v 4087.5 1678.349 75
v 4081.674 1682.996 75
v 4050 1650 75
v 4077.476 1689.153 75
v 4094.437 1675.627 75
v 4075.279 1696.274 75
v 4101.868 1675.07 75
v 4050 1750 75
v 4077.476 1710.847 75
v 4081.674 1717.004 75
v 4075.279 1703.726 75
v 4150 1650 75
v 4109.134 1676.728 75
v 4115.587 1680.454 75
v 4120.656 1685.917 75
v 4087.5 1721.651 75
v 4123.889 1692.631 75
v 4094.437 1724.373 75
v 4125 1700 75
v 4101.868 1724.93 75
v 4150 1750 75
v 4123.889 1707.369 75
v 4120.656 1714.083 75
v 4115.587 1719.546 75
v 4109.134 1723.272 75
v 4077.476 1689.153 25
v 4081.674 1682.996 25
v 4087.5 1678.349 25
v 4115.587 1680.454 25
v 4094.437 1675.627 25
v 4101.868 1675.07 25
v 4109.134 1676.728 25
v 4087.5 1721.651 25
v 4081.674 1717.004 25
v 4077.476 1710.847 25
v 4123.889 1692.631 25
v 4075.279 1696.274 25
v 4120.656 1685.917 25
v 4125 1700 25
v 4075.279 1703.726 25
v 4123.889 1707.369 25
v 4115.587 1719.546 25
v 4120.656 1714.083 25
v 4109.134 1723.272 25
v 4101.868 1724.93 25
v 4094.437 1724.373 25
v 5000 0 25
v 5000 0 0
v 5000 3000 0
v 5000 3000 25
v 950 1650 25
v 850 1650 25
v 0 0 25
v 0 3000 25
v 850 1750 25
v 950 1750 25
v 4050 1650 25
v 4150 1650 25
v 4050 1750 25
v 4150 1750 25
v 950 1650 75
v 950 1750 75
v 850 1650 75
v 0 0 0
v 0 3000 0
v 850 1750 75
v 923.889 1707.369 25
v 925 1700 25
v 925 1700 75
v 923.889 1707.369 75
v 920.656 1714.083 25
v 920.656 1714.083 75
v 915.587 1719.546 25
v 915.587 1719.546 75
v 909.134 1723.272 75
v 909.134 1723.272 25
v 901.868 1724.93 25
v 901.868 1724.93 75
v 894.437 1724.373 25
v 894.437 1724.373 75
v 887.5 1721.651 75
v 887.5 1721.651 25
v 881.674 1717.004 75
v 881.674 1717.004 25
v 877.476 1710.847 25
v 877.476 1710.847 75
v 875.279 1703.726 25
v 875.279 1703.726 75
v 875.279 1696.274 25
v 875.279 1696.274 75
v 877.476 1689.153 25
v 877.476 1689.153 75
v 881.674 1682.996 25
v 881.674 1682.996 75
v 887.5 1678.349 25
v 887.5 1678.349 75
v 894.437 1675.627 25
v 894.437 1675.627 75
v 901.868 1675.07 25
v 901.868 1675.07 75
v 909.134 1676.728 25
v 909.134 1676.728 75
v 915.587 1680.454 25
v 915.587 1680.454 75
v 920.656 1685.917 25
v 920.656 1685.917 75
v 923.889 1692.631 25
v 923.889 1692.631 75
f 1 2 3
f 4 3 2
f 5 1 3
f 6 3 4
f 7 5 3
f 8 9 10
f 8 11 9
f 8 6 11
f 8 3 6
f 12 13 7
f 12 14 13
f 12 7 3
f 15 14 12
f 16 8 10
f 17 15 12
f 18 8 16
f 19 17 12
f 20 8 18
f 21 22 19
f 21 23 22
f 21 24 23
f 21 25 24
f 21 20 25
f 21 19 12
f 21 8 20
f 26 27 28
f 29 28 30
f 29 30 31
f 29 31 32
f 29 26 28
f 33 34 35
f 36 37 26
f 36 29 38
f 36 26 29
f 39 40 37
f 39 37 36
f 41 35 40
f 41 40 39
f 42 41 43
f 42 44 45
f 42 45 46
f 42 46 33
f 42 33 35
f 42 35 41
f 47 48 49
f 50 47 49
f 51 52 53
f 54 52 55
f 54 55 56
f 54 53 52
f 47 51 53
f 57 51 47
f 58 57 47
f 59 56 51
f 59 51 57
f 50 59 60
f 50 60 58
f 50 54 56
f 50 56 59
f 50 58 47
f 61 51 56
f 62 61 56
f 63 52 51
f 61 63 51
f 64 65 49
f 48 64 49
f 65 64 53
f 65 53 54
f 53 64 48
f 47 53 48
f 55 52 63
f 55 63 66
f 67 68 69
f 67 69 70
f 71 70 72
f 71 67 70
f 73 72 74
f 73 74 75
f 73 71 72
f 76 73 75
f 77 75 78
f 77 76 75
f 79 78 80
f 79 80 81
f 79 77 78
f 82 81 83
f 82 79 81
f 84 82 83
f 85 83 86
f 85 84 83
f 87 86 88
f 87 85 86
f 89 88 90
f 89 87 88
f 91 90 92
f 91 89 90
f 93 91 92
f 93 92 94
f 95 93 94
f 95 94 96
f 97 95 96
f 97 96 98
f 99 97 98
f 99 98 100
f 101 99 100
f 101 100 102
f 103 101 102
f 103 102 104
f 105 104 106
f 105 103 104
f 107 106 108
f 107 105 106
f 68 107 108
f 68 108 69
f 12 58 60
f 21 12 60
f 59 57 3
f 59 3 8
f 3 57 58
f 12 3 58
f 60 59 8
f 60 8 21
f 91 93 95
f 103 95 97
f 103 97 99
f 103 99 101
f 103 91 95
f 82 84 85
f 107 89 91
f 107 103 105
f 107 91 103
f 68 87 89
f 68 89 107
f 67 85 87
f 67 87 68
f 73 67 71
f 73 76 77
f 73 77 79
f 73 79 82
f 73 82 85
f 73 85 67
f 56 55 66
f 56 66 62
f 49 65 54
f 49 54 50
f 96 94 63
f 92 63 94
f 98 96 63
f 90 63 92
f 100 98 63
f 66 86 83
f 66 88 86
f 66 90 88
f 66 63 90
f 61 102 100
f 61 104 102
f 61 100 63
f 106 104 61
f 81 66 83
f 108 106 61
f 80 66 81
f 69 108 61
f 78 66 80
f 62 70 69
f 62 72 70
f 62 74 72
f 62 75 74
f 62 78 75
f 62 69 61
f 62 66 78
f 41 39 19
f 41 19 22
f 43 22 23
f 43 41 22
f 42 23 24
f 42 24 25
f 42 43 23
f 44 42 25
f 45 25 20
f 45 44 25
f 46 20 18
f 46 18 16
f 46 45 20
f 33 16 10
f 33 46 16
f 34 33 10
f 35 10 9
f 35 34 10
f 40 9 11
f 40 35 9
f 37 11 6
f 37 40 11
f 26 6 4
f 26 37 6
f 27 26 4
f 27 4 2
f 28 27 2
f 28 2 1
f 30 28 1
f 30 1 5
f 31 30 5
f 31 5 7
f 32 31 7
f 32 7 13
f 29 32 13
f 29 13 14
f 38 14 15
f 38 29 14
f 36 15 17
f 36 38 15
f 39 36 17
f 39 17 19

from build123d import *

# Parameters (mm, degrees)
F0_W     = 5000
F0_H     = 3000
F1_DEPTH = 25
F3_W     = 100
F3_H     = 100
F3_R     = 25
F4_DEPTH = 50


with BuildPart() as f1:
    # F0 (on Top) → F1 (new body)
    with BuildSketch(Plane.XY):
        with Locations((2500, 1500)):
            Rectangle(F0_W, F0_H)
    extrude(amount=F1_DEPTH)

    # F3 (on face) → F4 (join)
    with BuildSketch(Plane.XY.offset(25)):
        with Locations((4100, 1700)):
            Rectangle(F3_W, F3_H)
        with Locations((4100, 1700)):
            Circle(F3_R, mode=Mode.SUBTRACT)
        with Locations((900, 1700)):
            Rectangle(F3_W, F3_H)
        with Locations((900, 1700)):
            Circle(F3_R, mode=Mode.SUBTRACT)
    extrude(amount=F4_DEPTH)


solid = f1.part
